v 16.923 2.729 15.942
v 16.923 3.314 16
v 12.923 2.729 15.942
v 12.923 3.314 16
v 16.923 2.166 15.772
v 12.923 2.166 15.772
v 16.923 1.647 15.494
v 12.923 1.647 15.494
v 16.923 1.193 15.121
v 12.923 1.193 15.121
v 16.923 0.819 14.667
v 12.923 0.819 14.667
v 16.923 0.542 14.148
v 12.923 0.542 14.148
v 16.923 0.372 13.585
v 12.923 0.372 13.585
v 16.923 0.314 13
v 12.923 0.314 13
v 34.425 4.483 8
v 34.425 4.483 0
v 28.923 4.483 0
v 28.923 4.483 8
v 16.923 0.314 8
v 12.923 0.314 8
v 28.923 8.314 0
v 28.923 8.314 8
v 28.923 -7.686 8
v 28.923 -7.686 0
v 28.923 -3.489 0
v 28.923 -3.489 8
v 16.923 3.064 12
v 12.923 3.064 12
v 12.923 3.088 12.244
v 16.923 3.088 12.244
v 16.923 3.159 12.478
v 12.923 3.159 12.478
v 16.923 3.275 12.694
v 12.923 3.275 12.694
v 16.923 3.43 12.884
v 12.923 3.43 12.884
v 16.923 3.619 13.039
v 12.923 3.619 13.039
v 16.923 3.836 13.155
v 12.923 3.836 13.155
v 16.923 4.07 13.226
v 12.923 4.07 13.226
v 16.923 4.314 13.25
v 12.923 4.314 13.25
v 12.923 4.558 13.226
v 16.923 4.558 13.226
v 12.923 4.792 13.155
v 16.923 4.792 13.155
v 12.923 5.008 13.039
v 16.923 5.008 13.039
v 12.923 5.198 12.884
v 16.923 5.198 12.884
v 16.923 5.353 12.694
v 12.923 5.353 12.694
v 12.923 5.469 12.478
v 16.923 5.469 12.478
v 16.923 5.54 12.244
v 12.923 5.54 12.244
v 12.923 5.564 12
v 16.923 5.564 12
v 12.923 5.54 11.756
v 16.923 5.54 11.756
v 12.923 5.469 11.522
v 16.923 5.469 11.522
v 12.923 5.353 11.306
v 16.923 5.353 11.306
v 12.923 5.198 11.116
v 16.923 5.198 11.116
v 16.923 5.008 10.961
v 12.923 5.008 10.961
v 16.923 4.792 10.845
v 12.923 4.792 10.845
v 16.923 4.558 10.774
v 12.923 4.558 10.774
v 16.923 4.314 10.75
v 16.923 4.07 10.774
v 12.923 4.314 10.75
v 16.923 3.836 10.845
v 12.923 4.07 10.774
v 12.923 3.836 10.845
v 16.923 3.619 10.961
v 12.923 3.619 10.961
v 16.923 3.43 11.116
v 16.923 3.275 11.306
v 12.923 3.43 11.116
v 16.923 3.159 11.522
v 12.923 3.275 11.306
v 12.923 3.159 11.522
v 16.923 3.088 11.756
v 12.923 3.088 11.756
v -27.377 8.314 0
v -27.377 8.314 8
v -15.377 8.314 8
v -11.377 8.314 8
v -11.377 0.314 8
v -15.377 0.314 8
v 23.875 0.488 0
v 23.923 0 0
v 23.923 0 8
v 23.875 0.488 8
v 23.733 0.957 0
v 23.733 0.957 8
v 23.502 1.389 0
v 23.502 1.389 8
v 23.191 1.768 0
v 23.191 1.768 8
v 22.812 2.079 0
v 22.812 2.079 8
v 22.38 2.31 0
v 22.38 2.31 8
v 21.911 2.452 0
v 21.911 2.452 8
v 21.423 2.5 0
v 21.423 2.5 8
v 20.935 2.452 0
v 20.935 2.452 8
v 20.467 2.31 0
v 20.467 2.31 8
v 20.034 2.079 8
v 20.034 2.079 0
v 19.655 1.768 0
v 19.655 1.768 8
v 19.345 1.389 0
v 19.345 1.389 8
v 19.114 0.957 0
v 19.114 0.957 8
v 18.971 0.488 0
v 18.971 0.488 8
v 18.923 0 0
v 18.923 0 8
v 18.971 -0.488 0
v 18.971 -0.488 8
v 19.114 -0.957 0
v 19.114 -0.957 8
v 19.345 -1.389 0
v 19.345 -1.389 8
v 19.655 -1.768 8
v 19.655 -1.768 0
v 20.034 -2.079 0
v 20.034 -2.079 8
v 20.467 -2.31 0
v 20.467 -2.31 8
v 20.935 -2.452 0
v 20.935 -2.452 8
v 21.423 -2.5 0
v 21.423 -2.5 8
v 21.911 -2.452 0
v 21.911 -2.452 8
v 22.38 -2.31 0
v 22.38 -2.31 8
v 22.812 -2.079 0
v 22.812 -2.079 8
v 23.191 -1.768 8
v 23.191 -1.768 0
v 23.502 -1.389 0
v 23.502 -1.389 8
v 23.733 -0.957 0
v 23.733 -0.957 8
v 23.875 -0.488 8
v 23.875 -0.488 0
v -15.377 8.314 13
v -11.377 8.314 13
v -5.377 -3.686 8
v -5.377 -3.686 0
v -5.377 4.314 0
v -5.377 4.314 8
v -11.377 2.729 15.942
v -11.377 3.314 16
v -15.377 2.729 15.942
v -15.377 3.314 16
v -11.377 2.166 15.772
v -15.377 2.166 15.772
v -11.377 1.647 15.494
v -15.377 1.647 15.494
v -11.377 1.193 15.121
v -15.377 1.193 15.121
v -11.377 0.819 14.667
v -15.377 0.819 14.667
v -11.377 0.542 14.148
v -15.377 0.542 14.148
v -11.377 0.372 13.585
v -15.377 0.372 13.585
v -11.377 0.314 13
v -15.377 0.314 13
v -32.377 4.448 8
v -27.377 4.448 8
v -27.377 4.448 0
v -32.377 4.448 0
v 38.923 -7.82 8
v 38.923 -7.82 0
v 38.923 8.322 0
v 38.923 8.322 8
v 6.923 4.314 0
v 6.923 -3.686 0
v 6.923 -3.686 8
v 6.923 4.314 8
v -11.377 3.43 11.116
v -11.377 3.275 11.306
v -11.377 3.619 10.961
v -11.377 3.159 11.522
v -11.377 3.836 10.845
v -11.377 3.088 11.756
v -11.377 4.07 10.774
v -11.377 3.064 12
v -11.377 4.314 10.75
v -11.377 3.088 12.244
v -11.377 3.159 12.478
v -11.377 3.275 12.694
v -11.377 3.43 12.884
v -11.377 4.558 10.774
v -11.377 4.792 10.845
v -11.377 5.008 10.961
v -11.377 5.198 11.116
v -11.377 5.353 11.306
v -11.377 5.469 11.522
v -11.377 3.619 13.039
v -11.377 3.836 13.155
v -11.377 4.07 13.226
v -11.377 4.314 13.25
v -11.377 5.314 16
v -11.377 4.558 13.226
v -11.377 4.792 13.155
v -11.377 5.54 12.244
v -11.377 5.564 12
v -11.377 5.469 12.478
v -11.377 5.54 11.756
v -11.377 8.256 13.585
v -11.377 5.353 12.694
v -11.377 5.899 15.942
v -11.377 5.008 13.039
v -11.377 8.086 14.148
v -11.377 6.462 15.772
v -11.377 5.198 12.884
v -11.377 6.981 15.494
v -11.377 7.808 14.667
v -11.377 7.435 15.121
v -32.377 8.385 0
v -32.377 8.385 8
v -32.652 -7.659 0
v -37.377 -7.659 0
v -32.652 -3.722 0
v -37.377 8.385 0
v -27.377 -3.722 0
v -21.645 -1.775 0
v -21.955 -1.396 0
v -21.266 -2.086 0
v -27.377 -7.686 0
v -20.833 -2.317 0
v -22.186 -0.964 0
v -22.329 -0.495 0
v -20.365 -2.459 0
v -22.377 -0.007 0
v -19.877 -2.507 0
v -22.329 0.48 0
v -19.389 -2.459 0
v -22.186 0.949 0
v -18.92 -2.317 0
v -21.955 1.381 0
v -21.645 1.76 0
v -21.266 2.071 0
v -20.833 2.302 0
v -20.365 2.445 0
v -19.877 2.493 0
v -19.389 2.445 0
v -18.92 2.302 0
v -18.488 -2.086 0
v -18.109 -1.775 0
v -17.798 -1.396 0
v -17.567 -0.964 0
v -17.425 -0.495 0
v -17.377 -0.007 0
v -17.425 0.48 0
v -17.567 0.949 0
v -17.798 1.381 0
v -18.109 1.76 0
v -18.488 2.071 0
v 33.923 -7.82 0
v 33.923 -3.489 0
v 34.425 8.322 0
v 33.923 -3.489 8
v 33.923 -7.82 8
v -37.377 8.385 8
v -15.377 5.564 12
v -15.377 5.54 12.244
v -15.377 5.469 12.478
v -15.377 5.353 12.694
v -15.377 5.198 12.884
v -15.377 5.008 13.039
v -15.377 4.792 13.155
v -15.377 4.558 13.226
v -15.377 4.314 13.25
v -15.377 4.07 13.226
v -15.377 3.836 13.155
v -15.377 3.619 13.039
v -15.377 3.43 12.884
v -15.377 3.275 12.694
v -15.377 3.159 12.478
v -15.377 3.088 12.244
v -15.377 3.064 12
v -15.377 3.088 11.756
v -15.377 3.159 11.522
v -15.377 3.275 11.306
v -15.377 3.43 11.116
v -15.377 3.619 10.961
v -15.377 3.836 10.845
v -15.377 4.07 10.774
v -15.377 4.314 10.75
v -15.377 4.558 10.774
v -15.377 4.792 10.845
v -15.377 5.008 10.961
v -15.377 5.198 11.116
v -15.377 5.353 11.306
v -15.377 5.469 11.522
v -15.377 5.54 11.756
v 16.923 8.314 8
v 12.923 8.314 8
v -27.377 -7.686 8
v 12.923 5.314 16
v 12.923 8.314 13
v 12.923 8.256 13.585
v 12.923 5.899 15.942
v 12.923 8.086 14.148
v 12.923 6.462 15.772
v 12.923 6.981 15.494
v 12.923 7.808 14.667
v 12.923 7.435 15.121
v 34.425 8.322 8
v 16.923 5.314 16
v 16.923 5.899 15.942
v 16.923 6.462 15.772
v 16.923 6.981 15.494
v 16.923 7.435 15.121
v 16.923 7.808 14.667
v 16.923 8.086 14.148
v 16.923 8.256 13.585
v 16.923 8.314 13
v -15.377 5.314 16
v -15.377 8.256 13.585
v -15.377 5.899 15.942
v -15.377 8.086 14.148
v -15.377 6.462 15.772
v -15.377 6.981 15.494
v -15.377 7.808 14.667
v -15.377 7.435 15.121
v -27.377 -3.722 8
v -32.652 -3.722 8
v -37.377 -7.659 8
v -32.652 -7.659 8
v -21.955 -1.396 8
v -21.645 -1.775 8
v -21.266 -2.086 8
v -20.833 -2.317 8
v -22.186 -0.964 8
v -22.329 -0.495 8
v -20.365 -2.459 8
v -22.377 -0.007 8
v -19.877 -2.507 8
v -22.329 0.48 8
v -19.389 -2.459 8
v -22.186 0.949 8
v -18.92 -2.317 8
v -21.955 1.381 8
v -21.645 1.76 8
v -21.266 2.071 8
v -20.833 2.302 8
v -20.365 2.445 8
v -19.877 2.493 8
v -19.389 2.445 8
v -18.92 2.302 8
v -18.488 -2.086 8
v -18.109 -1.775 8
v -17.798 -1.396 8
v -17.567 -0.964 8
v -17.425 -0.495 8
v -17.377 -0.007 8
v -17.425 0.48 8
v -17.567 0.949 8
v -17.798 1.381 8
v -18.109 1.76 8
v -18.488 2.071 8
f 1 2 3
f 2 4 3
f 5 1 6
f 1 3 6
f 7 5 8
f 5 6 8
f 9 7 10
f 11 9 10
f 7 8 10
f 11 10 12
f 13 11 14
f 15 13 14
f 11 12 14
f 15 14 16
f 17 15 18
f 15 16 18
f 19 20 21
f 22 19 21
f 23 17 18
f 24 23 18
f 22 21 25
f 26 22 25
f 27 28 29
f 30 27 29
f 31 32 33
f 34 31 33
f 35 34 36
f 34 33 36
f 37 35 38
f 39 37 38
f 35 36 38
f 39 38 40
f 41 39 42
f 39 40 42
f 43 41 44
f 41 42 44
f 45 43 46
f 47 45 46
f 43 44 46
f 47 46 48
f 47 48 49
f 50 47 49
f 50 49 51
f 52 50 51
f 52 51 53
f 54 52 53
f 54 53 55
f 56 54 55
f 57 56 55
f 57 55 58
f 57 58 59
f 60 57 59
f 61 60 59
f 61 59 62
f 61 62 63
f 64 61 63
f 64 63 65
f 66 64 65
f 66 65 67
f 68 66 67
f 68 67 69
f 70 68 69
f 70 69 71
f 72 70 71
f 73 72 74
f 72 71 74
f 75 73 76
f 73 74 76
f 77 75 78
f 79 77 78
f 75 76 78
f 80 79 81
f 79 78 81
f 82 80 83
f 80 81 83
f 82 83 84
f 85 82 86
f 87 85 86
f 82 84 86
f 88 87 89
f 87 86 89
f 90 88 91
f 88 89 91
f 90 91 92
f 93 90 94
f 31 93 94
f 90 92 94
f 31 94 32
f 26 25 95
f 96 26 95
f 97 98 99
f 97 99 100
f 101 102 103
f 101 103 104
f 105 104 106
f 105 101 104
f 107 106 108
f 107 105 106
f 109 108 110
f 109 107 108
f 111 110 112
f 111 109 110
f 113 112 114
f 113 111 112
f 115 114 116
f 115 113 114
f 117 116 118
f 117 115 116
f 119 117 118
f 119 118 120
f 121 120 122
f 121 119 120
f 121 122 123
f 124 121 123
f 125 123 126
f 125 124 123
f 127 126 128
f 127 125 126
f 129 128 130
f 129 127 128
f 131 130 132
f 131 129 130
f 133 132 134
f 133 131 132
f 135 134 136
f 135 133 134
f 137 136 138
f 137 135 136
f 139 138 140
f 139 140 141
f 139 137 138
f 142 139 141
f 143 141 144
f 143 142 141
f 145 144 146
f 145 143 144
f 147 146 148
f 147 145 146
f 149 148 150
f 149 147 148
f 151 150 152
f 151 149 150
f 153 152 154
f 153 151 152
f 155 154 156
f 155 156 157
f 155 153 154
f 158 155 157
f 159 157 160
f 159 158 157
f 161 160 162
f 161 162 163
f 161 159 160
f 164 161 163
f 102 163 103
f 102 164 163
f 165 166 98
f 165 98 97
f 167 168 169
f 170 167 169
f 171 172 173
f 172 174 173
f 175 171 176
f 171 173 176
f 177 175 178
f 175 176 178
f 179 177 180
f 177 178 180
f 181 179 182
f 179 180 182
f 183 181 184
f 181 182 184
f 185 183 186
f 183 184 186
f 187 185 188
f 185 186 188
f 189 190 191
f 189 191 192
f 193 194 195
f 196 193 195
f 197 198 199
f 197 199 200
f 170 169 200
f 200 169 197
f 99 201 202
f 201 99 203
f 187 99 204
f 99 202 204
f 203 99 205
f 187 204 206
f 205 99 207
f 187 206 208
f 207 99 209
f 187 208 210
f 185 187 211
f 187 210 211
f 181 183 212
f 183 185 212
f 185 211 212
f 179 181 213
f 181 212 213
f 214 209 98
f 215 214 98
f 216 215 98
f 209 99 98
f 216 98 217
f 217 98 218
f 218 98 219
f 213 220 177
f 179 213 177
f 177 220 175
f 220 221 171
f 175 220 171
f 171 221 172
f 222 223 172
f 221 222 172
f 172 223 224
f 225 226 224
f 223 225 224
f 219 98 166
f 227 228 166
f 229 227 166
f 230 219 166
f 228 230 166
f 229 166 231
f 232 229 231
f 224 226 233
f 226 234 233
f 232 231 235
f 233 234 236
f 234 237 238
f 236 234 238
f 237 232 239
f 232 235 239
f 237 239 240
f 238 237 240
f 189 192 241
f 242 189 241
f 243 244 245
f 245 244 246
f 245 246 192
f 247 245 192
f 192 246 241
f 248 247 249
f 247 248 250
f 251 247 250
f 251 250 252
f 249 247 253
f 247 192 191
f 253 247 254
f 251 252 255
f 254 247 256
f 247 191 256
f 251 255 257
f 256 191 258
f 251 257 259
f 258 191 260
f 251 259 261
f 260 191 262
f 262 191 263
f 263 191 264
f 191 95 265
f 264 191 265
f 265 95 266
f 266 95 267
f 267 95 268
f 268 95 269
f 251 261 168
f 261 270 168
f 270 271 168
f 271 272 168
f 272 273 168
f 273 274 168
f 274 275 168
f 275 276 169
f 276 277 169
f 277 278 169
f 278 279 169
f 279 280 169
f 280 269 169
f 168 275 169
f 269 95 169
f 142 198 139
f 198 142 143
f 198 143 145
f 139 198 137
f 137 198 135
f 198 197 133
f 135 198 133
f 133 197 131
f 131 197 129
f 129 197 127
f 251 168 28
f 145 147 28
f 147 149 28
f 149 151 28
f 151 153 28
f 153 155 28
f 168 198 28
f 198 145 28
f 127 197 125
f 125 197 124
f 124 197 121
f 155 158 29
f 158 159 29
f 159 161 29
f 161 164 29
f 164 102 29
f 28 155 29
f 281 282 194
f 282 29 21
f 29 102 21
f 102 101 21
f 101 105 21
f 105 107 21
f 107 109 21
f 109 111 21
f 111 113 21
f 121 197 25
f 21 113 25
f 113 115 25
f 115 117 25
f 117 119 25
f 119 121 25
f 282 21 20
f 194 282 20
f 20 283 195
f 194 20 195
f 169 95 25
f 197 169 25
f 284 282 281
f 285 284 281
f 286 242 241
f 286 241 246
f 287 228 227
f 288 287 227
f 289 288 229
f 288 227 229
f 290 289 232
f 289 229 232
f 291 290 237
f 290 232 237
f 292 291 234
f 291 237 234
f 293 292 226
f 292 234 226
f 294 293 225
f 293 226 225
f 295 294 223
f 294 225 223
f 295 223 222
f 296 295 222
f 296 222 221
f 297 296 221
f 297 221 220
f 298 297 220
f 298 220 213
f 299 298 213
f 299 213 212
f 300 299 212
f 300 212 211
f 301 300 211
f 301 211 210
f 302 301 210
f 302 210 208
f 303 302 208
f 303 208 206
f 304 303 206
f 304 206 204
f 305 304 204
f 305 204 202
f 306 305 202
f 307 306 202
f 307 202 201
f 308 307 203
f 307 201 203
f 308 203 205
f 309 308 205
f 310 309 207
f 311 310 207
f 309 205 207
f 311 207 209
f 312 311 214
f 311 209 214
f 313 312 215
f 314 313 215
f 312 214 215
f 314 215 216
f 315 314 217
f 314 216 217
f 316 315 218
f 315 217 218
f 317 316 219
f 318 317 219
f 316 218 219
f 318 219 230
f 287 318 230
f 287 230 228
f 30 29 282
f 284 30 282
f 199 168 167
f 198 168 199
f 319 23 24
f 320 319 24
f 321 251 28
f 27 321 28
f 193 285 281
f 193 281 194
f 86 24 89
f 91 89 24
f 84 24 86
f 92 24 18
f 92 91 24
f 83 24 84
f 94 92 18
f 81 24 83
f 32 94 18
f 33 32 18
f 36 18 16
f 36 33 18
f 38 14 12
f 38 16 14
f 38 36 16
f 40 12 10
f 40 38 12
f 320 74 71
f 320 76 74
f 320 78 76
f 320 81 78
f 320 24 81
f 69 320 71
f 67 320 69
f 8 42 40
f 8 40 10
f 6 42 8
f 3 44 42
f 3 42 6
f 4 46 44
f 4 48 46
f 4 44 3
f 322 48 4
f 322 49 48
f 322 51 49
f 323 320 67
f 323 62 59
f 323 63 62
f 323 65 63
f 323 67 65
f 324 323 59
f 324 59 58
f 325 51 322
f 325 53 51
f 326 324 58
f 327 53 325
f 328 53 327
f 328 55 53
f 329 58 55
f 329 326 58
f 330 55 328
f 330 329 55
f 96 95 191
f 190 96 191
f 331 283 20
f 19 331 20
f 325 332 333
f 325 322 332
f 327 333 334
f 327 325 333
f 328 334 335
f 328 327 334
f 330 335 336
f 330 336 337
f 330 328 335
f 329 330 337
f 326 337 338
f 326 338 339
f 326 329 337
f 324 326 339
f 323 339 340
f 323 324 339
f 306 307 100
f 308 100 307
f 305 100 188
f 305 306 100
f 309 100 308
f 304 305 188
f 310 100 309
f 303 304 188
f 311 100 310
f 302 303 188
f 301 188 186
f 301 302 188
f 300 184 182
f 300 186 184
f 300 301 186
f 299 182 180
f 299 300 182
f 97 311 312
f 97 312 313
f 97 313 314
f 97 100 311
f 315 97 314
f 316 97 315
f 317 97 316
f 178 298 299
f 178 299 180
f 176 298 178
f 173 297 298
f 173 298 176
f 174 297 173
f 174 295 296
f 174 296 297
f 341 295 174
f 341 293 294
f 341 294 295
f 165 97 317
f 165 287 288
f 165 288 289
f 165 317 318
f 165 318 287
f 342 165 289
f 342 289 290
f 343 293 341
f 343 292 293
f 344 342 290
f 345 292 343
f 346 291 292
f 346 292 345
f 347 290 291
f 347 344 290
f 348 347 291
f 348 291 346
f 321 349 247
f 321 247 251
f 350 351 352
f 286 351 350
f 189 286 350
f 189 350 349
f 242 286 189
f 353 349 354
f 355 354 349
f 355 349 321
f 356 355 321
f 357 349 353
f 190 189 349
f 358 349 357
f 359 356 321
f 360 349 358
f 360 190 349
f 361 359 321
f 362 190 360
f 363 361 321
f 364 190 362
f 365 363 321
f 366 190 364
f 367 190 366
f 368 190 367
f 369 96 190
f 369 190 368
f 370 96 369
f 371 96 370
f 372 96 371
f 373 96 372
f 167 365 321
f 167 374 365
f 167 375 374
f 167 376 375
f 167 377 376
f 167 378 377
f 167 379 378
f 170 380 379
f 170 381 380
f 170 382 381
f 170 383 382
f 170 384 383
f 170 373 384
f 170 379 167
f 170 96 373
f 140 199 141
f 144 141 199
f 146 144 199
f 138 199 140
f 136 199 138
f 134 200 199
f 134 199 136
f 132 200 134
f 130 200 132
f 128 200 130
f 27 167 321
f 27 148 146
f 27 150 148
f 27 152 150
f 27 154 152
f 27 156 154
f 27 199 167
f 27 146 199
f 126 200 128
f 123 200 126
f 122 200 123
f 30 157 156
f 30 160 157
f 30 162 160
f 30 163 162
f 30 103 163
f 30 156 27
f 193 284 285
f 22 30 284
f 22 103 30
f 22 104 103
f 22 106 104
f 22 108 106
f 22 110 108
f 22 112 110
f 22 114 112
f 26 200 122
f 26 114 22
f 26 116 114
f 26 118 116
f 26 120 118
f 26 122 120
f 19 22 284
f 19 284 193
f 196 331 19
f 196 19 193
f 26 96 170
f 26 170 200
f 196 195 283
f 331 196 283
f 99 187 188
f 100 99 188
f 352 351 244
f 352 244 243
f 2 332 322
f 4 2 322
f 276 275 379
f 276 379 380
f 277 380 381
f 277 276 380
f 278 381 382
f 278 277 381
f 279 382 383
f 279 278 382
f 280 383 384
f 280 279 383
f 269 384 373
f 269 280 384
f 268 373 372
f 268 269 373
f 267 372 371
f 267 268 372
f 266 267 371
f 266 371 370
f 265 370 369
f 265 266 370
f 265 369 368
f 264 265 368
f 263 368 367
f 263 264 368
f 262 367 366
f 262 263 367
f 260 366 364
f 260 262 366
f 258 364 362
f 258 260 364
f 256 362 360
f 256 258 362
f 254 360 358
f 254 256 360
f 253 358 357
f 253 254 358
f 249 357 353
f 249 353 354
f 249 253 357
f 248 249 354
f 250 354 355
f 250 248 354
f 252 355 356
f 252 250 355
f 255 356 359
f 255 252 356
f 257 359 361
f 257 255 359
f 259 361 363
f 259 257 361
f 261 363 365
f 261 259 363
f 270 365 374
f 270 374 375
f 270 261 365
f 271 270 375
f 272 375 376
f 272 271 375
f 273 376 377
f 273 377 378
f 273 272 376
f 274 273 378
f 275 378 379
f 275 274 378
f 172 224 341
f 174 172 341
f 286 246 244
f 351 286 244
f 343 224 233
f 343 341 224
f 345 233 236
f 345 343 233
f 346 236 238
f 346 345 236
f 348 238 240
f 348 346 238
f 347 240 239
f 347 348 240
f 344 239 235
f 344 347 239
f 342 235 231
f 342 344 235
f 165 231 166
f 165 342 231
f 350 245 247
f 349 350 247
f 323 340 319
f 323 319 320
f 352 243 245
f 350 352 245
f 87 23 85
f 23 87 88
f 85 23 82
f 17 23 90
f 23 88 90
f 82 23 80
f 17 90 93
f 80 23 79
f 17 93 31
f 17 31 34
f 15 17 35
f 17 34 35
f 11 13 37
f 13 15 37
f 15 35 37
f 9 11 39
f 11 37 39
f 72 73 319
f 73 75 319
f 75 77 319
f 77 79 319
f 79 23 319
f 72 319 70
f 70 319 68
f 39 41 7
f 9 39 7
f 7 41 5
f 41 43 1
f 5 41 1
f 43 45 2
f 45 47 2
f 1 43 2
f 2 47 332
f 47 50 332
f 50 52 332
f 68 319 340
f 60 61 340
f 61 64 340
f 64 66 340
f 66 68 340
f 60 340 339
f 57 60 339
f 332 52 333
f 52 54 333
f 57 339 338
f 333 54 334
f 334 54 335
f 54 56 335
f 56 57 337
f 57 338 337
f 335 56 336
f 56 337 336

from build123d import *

# Parameters (mm, degrees)
F0_R     = 2.5
F0_W     = 12.3
F0_H     = 8
F1_DEPTH = 8
F2_W     = 4
F2_H     = 8
F3_DEPTH = 8
F4_R     = 3
F4_2_R   = 3
F6_D     = 2.5
F8_D     = 2.5


with BuildPart() as f1:
    # F0 (on Top) → F1 (new body)
    with BuildSketch(Plane.XY):
        Polygon((28.9232236624, 8.3138846643), (-27.3767763376, 8.3138846643), (-27.3767763376, 4.4477586634), (-27.3767763376, -3.7215636112), (-27.3767763376, -7.6861153357), (28.9232236624, -7.6861153357), (28.9232236624, -3.4892642871), (28.9232236624, 4.4832061976), align=None)
        with Locations((-19.8767763376, -0.0074267669)):
            Circle(F0_R, mode=Mode.SUBTRACT)
        with Locations((21.4232236624, 0)):
            Circle(F0_R, mode=Mode.SUBTRACT)
        with Locations((0.7732236624, 0.3138846643)):
            Rectangle(F0_W, F0_H, mode=Mode.SUBTRACT)
        Polygon((-27.3767763376, -3.7215636112), (-27.3767763376, 4.4477586634), (-32.3767763376, 4.4477586634), (-32.3767763376, 8.3847809583), (-37.3767763376, 8.3847809583), (-37.3767763376, -7.658585906), (-32.6523520052, -7.658585906), (-32.6523520052, -3.7215636112), align=None)
        Polygon((34.4248153269, 4.4832061976), (28.9232236624, 4.4832061976), (28.9232236624, -3.4892642871), (33.9232236624, -3.4892642871), (33.9232236624, -7.8199887648), (38.9232236624, -7.8199887648), (38.9232236624, 8.3218030632), (34.4248153269, 8.3218030632), align=None)
    extrude(amount=F1_DEPTH)


with BuildPart() as f3:
    # F2 (on face) → F3 (new body)
    with BuildSketch(Plane(origin=(0, 8.3138846643, 0), x_dir=(-1, 0, 0), z_dir=(0, 1, 0))):
        with Locations((13.3767763376, 12)):
            Rectangle(F2_W, F2_H)
    extrude(amount=-F3_DEPTH)

    # F4#2
    f4_2_edges = [f3.edges().sort_by_distance(p)[0] for p in [
        (-13.376776, 8.313885, 16),
        (-13.376776, 0.313885, 16),
    ]]
    fillet(f4_2_edges, radius=F4_2_R)

    # F6 (through all)
    with Locations(Plane(origin=(-15.3767763376, 0, 0), x_dir=(0, -1, 0), z_dir=(-1, 0, 0))):
        with Locations((-4.3138846643, 12)):
            Hole(F6_D / 2)


with BuildPart() as f3b:
    # F2 (on face) → F3, piece 2 (new body)
    with BuildSketch(Plane(origin=(0, 8.3138846643, 0), x_dir=(-1, 0, 0), z_dir=(0, 1, 0))):
        with Locations((-14.9232236624, 12)):
            Rectangle(F2_W, F2_H)
    extrude(amount=-F3_DEPTH)

    # F4
    f4_edges = [f3b.edges().sort_by_distance(p)[0] for p in [
        (14.923224, 8.313885, 16),
        (14.923224, 0.313885, 16),
    ]]
    fillet(f4_edges, radius=F4_R)

    # F8 (through all)
    with Locations(Plane.YZ.offset(16.9232236624)):
        with Locations((4.3138846643, 12)):
            Hole(F8_D / 2)


solid = Compound([f1.part, f3.part, f3b.part])
